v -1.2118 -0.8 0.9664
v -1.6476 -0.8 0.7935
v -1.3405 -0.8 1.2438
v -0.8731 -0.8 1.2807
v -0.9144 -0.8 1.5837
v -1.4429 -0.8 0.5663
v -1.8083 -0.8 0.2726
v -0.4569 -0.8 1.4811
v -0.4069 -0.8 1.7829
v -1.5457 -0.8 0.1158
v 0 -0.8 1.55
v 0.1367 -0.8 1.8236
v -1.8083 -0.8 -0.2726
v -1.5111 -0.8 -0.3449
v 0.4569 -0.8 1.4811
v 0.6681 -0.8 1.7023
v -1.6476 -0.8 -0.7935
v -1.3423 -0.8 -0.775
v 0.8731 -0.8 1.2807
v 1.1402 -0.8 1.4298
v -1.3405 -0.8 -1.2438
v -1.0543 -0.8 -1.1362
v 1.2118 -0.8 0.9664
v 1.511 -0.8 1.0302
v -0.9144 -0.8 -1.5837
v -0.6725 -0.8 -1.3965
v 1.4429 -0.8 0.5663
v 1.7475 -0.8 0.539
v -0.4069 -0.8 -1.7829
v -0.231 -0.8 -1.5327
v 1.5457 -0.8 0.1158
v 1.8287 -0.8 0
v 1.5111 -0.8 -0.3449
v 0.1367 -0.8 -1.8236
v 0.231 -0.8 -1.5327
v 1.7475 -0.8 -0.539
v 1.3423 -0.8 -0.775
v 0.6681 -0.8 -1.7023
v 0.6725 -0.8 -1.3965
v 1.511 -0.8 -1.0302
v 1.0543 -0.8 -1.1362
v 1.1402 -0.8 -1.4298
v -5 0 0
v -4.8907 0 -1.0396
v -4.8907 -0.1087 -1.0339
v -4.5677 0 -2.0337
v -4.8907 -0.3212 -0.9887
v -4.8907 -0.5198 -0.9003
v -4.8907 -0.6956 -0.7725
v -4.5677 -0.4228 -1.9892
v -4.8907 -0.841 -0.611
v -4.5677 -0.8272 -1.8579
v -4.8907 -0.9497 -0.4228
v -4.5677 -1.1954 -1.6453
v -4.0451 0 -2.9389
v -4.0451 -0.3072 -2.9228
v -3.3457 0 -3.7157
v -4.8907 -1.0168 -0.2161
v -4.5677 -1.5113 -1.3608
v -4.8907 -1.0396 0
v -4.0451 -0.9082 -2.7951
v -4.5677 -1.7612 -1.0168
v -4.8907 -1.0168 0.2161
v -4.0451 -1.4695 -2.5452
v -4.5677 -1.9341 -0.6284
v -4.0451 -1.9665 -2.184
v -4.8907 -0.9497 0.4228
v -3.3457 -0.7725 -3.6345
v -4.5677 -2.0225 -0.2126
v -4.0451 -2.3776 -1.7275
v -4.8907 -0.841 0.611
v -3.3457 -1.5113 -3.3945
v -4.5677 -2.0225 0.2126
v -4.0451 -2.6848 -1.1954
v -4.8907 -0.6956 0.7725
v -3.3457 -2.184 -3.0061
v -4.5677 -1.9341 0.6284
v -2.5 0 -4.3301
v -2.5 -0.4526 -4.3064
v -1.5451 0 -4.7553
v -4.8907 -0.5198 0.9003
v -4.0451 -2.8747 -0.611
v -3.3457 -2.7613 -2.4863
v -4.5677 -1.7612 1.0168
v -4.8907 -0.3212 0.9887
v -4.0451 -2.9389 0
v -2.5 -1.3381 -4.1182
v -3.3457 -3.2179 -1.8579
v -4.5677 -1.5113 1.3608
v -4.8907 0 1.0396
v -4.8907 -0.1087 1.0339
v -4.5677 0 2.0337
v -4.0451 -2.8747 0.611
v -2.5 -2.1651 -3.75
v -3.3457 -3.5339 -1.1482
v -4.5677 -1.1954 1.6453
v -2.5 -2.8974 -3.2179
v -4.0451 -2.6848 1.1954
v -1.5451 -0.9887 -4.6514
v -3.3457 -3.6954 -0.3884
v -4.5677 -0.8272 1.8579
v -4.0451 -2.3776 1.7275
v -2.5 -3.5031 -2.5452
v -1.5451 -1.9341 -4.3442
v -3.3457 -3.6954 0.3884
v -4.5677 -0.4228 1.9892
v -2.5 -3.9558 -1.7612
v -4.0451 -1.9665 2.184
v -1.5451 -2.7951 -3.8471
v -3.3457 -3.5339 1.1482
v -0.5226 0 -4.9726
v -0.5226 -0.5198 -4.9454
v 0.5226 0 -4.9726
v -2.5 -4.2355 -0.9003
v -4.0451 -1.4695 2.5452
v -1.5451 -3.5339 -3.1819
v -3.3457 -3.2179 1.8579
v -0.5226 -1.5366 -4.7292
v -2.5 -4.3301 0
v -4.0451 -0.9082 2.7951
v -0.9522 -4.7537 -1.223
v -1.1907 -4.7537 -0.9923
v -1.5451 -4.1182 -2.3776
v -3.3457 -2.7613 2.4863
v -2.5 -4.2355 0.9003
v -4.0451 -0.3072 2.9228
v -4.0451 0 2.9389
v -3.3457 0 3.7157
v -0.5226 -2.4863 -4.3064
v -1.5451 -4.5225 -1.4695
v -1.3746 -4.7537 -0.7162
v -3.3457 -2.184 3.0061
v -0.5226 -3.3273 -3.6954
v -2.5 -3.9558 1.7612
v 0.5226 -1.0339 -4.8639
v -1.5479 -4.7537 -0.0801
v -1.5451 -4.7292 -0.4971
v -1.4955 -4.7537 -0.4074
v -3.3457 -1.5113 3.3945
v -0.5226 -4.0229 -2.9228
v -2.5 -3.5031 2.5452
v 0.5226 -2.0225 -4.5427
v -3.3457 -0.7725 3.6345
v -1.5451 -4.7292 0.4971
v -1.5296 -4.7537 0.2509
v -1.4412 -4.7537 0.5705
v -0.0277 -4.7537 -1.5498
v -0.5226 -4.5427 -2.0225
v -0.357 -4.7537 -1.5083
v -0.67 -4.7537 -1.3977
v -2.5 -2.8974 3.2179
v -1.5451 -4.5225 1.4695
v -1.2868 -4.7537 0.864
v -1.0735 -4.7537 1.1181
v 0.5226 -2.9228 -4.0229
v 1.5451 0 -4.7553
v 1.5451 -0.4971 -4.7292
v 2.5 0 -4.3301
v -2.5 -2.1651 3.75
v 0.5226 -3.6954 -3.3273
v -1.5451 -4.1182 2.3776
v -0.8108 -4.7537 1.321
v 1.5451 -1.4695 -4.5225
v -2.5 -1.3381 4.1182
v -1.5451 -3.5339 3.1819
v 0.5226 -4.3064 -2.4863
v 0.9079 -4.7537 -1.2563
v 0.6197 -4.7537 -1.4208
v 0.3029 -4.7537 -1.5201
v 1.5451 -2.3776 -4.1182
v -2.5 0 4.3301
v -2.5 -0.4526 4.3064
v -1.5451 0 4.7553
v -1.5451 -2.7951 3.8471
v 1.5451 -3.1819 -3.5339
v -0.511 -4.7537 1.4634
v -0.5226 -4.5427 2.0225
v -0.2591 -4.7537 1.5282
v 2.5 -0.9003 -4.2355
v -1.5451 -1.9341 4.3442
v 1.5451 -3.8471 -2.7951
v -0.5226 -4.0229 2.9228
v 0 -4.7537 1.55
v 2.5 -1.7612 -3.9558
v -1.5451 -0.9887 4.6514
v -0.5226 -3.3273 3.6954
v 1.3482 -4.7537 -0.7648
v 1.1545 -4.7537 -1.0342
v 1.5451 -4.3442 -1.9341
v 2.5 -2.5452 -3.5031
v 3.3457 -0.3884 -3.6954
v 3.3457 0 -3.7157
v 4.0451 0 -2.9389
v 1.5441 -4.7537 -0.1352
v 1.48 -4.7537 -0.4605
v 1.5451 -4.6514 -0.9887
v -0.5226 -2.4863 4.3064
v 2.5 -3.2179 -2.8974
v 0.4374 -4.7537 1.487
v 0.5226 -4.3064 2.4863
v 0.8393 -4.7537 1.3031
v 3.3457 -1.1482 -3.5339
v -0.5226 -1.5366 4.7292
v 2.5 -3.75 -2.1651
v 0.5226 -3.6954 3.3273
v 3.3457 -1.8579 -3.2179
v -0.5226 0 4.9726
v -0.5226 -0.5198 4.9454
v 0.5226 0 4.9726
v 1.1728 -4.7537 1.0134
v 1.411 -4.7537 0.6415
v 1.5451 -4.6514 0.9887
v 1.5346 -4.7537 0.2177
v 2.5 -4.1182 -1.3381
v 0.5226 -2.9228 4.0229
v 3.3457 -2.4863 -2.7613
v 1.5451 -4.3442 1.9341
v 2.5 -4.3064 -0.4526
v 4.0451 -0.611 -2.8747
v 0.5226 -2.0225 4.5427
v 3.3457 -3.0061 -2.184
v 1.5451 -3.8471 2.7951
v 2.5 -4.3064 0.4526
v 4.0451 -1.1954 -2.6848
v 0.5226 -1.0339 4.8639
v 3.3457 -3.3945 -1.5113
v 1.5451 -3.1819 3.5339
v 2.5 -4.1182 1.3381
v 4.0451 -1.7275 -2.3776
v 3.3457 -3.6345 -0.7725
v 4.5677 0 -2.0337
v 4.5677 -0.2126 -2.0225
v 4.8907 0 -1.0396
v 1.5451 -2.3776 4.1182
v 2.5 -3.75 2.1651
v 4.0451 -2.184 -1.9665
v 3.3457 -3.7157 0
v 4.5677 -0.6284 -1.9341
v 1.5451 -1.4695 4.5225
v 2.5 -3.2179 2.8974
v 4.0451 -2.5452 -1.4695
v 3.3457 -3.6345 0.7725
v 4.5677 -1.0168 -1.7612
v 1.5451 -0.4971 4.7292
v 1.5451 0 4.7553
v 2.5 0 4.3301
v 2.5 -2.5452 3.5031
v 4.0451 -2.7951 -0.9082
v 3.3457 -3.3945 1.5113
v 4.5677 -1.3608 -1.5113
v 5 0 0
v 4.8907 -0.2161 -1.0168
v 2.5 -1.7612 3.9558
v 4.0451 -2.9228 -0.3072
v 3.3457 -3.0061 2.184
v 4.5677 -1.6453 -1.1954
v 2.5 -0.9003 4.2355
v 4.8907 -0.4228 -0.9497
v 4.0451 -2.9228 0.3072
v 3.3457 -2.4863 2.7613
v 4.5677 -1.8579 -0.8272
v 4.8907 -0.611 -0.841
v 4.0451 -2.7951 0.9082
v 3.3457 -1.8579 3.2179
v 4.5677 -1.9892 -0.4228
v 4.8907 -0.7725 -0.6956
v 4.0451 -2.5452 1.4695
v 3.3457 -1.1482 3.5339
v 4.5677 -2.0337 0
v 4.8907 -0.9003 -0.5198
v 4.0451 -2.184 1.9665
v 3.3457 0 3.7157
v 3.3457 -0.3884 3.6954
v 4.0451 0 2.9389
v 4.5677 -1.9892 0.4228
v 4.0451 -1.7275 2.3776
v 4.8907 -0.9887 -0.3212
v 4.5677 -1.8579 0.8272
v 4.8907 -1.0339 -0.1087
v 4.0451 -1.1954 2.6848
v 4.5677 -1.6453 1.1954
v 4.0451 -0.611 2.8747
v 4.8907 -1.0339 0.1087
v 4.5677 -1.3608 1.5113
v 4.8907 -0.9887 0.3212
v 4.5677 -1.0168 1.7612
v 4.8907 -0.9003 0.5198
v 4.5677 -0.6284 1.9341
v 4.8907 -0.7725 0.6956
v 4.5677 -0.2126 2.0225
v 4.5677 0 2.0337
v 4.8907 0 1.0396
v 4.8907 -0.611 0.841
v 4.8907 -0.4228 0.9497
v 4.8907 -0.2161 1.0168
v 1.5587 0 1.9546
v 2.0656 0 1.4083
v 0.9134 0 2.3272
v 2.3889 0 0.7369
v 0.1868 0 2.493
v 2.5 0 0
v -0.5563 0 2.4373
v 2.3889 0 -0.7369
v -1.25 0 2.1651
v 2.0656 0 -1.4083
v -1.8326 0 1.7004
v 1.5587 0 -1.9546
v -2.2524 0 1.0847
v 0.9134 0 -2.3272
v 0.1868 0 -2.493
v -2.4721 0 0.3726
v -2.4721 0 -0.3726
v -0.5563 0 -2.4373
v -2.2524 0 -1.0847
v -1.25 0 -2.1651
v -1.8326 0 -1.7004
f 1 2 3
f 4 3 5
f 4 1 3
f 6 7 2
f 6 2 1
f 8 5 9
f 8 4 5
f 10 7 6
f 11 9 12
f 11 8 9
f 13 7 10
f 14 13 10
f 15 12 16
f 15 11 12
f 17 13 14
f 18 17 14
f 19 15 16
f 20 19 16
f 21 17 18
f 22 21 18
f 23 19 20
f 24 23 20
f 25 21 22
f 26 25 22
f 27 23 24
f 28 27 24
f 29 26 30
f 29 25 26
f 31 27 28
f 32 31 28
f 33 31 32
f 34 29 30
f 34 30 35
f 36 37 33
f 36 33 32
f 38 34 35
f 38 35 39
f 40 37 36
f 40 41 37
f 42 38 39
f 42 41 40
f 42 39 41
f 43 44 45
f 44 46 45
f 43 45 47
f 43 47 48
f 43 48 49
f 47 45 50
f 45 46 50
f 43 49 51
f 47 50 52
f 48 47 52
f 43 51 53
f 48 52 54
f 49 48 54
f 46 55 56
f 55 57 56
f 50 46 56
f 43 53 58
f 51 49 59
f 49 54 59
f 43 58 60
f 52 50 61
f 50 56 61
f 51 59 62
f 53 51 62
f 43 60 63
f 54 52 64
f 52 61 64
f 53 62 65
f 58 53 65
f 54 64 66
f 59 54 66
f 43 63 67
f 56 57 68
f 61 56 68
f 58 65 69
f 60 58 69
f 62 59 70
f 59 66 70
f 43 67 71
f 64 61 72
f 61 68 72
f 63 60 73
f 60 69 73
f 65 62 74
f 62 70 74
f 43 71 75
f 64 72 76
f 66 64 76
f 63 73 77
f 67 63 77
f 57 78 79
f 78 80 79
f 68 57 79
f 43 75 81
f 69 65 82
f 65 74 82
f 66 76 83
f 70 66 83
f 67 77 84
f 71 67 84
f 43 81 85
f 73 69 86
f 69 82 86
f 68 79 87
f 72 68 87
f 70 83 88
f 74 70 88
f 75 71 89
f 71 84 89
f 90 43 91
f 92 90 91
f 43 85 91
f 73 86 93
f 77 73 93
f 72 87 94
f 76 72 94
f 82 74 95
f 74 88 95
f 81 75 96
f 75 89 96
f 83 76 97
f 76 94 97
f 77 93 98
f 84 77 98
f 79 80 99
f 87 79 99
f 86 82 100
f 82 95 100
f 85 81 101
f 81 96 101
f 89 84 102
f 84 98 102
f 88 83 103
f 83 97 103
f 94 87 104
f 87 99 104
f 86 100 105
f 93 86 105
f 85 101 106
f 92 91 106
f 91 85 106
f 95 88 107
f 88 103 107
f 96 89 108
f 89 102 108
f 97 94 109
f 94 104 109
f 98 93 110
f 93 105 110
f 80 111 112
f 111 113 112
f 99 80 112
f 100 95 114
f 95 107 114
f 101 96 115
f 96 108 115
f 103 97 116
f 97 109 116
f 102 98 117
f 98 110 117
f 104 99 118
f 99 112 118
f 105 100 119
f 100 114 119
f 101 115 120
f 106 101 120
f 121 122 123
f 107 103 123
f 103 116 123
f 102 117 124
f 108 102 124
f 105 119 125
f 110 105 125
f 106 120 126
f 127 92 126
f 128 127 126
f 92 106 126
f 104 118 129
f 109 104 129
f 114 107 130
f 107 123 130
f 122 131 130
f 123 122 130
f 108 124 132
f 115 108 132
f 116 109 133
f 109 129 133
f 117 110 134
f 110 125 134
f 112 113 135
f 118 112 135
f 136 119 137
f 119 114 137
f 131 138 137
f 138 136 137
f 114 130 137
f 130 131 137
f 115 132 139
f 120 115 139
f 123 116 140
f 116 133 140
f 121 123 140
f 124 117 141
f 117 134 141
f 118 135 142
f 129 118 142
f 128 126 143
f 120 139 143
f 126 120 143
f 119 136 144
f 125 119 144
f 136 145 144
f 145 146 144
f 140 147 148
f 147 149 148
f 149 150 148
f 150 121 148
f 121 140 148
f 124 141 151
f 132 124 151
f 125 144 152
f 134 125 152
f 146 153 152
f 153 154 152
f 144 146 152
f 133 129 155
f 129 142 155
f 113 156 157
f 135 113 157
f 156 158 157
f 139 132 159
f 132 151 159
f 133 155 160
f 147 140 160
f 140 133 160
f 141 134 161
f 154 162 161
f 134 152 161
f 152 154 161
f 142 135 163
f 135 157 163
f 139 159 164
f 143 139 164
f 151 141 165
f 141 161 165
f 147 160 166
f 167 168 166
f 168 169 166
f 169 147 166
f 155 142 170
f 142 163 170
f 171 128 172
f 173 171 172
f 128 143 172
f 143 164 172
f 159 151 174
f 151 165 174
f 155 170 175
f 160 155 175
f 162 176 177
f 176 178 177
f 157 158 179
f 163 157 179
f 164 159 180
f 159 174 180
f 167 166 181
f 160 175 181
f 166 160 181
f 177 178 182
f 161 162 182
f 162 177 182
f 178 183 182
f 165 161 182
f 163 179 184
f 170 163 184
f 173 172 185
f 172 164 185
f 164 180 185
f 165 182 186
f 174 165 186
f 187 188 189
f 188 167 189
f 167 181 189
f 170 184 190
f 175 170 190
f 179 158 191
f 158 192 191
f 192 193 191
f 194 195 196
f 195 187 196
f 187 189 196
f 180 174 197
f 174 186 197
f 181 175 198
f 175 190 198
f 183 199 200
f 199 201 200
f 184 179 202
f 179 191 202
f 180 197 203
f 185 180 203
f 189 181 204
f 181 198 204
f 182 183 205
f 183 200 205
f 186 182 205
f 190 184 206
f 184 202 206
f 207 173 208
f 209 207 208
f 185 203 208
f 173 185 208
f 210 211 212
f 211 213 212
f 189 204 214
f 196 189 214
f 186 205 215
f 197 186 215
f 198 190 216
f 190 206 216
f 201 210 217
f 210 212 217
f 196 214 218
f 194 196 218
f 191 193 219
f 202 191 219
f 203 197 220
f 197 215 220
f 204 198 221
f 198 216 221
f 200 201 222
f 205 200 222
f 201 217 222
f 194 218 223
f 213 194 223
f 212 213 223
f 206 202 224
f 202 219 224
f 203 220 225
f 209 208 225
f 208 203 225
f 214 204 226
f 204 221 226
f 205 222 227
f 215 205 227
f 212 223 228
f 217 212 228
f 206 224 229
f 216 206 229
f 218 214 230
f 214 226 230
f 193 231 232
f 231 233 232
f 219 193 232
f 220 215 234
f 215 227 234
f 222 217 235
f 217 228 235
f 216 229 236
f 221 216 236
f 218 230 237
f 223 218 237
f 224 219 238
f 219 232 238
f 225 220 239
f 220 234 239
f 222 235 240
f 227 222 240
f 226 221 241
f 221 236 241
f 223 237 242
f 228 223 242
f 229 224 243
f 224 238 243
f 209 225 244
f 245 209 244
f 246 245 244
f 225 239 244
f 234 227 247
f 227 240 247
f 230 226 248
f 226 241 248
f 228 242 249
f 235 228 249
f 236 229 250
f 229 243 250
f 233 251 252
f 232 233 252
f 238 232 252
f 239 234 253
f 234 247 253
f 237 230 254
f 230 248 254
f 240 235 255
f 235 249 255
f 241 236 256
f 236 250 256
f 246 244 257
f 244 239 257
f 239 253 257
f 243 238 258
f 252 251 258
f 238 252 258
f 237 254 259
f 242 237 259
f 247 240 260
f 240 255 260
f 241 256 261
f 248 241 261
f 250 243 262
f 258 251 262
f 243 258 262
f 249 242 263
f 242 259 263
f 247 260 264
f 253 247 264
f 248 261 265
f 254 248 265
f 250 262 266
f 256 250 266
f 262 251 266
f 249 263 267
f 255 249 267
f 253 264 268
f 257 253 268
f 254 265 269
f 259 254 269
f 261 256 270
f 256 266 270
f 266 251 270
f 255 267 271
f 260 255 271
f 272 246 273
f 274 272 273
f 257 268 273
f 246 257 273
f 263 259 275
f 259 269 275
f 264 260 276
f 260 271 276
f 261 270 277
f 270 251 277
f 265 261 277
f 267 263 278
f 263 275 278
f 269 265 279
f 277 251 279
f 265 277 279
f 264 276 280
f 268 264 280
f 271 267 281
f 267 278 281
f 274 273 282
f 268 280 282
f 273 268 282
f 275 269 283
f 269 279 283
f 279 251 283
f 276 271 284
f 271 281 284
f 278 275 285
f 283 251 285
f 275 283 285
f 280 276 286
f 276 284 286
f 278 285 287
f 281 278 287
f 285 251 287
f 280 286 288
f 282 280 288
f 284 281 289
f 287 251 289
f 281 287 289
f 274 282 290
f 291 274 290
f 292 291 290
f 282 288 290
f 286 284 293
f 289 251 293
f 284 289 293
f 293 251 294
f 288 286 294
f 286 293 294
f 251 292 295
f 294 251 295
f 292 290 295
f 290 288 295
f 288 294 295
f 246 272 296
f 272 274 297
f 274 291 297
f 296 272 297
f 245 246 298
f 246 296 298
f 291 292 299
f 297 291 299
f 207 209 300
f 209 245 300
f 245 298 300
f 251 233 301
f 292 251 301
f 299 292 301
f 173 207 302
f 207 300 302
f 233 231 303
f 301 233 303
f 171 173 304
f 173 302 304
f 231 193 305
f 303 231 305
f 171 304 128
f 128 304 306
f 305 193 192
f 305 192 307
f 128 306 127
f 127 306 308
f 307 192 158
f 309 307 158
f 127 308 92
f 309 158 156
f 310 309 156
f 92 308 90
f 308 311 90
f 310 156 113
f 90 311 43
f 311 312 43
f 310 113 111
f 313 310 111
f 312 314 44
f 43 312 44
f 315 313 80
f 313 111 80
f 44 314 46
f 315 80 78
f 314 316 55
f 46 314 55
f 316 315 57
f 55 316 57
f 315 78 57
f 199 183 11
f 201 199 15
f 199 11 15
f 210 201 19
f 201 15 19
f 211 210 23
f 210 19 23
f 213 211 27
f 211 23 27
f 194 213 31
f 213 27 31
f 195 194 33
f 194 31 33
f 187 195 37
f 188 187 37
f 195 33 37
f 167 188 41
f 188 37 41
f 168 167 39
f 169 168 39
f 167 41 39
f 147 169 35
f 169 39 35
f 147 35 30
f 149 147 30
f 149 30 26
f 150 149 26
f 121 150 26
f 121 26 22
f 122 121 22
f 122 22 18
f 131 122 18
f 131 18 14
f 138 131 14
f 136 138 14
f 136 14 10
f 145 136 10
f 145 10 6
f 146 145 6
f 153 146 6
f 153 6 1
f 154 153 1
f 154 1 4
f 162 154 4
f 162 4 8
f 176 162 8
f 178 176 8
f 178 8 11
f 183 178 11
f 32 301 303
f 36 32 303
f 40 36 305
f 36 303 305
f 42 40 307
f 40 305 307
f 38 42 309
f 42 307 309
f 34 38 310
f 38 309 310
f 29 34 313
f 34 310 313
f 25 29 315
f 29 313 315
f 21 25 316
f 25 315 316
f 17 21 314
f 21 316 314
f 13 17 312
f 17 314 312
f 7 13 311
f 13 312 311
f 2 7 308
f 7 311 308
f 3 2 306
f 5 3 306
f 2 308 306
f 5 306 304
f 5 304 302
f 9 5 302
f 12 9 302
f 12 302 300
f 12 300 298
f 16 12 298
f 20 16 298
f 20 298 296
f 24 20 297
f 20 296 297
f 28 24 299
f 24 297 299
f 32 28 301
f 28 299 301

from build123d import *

# Parameters (mm, degrees)
REVOLVE1_ANGLE     = 180
SKETCH2_R          = 1.55
CUT_EXTRUDE1_DEPTH = 9.660254038
SKETCH3_R          = 2.5
CUT_EXTRUDE2_DEPTH = 0.8
CUT_EXTRUDE2_DRAFT = -40


with BuildPart() as part:
    # Sketch1 → Revolve1 (revolve)
    with BuildSketch(Plane(origin=(0, 0, 0), x_dir=(1, 0, 0), z_dir=(0, 1, 0))):
        with BuildLine():
            Line((5, 0), (-5, 0))
            ThreePointArc((-5, 0), (0, 5), (5, 0))
        make_face()
    revolve(axis=Axis((5, 0, 0), (-1, 0, 0)), revolution_arc=REVOLVE1_ANGLE)

    # Sketch2 → Cut-Extrude1 (cut, through all)
    with BuildSketch(Plane(origin=(0, 0, 0), x_dir=(1, 0, 0), z_dir=(0, 1, 0))):
        with Locations(Location((0, 0, 0), (0, 0, 270))):
            Circle(SKETCH2_R)
    extrude(amount=-CUT_EXTRUDE1_DEPTH, mode=Mode.SUBTRACT)


with BuildPart() as cut_extrude2_tool:
    # Sketch3 → Cut-Extrude2 (with draft: the straight prism first)
    with BuildSketch(Plane(origin=(0, 0, 0), x_dir=(1, 0, 0), z_dir=(0, 1, 0))):
        Circle(SKETCH3_R)
    extrude(amount=-CUT_EXTRUDE2_DEPTH)
    # Cut-Extrude2: the draft: its side faces are tilted about the plane it starts from
    cut_extrude2_sides = [cut_extrude2_tool.faces().sort_by_distance(p)[0] for p in [
        (-2.5, -0.4, 0),
    ]]
    draft(cut_extrude2_sides, Plane(origin=(0, 0, 0), x_dir=(1, 0, 0), z_dir=(0, 1, 0)), CUT_EXTRUDE2_DRAFT)


with BuildPart() as part_1:
    add(part.part)

    # Cut-Extrude2: cut by cut_extrude2_tool
    add(cut_extrude2_tool.part, mode=Mode.SUBTRACT)


solid = part_1.part
